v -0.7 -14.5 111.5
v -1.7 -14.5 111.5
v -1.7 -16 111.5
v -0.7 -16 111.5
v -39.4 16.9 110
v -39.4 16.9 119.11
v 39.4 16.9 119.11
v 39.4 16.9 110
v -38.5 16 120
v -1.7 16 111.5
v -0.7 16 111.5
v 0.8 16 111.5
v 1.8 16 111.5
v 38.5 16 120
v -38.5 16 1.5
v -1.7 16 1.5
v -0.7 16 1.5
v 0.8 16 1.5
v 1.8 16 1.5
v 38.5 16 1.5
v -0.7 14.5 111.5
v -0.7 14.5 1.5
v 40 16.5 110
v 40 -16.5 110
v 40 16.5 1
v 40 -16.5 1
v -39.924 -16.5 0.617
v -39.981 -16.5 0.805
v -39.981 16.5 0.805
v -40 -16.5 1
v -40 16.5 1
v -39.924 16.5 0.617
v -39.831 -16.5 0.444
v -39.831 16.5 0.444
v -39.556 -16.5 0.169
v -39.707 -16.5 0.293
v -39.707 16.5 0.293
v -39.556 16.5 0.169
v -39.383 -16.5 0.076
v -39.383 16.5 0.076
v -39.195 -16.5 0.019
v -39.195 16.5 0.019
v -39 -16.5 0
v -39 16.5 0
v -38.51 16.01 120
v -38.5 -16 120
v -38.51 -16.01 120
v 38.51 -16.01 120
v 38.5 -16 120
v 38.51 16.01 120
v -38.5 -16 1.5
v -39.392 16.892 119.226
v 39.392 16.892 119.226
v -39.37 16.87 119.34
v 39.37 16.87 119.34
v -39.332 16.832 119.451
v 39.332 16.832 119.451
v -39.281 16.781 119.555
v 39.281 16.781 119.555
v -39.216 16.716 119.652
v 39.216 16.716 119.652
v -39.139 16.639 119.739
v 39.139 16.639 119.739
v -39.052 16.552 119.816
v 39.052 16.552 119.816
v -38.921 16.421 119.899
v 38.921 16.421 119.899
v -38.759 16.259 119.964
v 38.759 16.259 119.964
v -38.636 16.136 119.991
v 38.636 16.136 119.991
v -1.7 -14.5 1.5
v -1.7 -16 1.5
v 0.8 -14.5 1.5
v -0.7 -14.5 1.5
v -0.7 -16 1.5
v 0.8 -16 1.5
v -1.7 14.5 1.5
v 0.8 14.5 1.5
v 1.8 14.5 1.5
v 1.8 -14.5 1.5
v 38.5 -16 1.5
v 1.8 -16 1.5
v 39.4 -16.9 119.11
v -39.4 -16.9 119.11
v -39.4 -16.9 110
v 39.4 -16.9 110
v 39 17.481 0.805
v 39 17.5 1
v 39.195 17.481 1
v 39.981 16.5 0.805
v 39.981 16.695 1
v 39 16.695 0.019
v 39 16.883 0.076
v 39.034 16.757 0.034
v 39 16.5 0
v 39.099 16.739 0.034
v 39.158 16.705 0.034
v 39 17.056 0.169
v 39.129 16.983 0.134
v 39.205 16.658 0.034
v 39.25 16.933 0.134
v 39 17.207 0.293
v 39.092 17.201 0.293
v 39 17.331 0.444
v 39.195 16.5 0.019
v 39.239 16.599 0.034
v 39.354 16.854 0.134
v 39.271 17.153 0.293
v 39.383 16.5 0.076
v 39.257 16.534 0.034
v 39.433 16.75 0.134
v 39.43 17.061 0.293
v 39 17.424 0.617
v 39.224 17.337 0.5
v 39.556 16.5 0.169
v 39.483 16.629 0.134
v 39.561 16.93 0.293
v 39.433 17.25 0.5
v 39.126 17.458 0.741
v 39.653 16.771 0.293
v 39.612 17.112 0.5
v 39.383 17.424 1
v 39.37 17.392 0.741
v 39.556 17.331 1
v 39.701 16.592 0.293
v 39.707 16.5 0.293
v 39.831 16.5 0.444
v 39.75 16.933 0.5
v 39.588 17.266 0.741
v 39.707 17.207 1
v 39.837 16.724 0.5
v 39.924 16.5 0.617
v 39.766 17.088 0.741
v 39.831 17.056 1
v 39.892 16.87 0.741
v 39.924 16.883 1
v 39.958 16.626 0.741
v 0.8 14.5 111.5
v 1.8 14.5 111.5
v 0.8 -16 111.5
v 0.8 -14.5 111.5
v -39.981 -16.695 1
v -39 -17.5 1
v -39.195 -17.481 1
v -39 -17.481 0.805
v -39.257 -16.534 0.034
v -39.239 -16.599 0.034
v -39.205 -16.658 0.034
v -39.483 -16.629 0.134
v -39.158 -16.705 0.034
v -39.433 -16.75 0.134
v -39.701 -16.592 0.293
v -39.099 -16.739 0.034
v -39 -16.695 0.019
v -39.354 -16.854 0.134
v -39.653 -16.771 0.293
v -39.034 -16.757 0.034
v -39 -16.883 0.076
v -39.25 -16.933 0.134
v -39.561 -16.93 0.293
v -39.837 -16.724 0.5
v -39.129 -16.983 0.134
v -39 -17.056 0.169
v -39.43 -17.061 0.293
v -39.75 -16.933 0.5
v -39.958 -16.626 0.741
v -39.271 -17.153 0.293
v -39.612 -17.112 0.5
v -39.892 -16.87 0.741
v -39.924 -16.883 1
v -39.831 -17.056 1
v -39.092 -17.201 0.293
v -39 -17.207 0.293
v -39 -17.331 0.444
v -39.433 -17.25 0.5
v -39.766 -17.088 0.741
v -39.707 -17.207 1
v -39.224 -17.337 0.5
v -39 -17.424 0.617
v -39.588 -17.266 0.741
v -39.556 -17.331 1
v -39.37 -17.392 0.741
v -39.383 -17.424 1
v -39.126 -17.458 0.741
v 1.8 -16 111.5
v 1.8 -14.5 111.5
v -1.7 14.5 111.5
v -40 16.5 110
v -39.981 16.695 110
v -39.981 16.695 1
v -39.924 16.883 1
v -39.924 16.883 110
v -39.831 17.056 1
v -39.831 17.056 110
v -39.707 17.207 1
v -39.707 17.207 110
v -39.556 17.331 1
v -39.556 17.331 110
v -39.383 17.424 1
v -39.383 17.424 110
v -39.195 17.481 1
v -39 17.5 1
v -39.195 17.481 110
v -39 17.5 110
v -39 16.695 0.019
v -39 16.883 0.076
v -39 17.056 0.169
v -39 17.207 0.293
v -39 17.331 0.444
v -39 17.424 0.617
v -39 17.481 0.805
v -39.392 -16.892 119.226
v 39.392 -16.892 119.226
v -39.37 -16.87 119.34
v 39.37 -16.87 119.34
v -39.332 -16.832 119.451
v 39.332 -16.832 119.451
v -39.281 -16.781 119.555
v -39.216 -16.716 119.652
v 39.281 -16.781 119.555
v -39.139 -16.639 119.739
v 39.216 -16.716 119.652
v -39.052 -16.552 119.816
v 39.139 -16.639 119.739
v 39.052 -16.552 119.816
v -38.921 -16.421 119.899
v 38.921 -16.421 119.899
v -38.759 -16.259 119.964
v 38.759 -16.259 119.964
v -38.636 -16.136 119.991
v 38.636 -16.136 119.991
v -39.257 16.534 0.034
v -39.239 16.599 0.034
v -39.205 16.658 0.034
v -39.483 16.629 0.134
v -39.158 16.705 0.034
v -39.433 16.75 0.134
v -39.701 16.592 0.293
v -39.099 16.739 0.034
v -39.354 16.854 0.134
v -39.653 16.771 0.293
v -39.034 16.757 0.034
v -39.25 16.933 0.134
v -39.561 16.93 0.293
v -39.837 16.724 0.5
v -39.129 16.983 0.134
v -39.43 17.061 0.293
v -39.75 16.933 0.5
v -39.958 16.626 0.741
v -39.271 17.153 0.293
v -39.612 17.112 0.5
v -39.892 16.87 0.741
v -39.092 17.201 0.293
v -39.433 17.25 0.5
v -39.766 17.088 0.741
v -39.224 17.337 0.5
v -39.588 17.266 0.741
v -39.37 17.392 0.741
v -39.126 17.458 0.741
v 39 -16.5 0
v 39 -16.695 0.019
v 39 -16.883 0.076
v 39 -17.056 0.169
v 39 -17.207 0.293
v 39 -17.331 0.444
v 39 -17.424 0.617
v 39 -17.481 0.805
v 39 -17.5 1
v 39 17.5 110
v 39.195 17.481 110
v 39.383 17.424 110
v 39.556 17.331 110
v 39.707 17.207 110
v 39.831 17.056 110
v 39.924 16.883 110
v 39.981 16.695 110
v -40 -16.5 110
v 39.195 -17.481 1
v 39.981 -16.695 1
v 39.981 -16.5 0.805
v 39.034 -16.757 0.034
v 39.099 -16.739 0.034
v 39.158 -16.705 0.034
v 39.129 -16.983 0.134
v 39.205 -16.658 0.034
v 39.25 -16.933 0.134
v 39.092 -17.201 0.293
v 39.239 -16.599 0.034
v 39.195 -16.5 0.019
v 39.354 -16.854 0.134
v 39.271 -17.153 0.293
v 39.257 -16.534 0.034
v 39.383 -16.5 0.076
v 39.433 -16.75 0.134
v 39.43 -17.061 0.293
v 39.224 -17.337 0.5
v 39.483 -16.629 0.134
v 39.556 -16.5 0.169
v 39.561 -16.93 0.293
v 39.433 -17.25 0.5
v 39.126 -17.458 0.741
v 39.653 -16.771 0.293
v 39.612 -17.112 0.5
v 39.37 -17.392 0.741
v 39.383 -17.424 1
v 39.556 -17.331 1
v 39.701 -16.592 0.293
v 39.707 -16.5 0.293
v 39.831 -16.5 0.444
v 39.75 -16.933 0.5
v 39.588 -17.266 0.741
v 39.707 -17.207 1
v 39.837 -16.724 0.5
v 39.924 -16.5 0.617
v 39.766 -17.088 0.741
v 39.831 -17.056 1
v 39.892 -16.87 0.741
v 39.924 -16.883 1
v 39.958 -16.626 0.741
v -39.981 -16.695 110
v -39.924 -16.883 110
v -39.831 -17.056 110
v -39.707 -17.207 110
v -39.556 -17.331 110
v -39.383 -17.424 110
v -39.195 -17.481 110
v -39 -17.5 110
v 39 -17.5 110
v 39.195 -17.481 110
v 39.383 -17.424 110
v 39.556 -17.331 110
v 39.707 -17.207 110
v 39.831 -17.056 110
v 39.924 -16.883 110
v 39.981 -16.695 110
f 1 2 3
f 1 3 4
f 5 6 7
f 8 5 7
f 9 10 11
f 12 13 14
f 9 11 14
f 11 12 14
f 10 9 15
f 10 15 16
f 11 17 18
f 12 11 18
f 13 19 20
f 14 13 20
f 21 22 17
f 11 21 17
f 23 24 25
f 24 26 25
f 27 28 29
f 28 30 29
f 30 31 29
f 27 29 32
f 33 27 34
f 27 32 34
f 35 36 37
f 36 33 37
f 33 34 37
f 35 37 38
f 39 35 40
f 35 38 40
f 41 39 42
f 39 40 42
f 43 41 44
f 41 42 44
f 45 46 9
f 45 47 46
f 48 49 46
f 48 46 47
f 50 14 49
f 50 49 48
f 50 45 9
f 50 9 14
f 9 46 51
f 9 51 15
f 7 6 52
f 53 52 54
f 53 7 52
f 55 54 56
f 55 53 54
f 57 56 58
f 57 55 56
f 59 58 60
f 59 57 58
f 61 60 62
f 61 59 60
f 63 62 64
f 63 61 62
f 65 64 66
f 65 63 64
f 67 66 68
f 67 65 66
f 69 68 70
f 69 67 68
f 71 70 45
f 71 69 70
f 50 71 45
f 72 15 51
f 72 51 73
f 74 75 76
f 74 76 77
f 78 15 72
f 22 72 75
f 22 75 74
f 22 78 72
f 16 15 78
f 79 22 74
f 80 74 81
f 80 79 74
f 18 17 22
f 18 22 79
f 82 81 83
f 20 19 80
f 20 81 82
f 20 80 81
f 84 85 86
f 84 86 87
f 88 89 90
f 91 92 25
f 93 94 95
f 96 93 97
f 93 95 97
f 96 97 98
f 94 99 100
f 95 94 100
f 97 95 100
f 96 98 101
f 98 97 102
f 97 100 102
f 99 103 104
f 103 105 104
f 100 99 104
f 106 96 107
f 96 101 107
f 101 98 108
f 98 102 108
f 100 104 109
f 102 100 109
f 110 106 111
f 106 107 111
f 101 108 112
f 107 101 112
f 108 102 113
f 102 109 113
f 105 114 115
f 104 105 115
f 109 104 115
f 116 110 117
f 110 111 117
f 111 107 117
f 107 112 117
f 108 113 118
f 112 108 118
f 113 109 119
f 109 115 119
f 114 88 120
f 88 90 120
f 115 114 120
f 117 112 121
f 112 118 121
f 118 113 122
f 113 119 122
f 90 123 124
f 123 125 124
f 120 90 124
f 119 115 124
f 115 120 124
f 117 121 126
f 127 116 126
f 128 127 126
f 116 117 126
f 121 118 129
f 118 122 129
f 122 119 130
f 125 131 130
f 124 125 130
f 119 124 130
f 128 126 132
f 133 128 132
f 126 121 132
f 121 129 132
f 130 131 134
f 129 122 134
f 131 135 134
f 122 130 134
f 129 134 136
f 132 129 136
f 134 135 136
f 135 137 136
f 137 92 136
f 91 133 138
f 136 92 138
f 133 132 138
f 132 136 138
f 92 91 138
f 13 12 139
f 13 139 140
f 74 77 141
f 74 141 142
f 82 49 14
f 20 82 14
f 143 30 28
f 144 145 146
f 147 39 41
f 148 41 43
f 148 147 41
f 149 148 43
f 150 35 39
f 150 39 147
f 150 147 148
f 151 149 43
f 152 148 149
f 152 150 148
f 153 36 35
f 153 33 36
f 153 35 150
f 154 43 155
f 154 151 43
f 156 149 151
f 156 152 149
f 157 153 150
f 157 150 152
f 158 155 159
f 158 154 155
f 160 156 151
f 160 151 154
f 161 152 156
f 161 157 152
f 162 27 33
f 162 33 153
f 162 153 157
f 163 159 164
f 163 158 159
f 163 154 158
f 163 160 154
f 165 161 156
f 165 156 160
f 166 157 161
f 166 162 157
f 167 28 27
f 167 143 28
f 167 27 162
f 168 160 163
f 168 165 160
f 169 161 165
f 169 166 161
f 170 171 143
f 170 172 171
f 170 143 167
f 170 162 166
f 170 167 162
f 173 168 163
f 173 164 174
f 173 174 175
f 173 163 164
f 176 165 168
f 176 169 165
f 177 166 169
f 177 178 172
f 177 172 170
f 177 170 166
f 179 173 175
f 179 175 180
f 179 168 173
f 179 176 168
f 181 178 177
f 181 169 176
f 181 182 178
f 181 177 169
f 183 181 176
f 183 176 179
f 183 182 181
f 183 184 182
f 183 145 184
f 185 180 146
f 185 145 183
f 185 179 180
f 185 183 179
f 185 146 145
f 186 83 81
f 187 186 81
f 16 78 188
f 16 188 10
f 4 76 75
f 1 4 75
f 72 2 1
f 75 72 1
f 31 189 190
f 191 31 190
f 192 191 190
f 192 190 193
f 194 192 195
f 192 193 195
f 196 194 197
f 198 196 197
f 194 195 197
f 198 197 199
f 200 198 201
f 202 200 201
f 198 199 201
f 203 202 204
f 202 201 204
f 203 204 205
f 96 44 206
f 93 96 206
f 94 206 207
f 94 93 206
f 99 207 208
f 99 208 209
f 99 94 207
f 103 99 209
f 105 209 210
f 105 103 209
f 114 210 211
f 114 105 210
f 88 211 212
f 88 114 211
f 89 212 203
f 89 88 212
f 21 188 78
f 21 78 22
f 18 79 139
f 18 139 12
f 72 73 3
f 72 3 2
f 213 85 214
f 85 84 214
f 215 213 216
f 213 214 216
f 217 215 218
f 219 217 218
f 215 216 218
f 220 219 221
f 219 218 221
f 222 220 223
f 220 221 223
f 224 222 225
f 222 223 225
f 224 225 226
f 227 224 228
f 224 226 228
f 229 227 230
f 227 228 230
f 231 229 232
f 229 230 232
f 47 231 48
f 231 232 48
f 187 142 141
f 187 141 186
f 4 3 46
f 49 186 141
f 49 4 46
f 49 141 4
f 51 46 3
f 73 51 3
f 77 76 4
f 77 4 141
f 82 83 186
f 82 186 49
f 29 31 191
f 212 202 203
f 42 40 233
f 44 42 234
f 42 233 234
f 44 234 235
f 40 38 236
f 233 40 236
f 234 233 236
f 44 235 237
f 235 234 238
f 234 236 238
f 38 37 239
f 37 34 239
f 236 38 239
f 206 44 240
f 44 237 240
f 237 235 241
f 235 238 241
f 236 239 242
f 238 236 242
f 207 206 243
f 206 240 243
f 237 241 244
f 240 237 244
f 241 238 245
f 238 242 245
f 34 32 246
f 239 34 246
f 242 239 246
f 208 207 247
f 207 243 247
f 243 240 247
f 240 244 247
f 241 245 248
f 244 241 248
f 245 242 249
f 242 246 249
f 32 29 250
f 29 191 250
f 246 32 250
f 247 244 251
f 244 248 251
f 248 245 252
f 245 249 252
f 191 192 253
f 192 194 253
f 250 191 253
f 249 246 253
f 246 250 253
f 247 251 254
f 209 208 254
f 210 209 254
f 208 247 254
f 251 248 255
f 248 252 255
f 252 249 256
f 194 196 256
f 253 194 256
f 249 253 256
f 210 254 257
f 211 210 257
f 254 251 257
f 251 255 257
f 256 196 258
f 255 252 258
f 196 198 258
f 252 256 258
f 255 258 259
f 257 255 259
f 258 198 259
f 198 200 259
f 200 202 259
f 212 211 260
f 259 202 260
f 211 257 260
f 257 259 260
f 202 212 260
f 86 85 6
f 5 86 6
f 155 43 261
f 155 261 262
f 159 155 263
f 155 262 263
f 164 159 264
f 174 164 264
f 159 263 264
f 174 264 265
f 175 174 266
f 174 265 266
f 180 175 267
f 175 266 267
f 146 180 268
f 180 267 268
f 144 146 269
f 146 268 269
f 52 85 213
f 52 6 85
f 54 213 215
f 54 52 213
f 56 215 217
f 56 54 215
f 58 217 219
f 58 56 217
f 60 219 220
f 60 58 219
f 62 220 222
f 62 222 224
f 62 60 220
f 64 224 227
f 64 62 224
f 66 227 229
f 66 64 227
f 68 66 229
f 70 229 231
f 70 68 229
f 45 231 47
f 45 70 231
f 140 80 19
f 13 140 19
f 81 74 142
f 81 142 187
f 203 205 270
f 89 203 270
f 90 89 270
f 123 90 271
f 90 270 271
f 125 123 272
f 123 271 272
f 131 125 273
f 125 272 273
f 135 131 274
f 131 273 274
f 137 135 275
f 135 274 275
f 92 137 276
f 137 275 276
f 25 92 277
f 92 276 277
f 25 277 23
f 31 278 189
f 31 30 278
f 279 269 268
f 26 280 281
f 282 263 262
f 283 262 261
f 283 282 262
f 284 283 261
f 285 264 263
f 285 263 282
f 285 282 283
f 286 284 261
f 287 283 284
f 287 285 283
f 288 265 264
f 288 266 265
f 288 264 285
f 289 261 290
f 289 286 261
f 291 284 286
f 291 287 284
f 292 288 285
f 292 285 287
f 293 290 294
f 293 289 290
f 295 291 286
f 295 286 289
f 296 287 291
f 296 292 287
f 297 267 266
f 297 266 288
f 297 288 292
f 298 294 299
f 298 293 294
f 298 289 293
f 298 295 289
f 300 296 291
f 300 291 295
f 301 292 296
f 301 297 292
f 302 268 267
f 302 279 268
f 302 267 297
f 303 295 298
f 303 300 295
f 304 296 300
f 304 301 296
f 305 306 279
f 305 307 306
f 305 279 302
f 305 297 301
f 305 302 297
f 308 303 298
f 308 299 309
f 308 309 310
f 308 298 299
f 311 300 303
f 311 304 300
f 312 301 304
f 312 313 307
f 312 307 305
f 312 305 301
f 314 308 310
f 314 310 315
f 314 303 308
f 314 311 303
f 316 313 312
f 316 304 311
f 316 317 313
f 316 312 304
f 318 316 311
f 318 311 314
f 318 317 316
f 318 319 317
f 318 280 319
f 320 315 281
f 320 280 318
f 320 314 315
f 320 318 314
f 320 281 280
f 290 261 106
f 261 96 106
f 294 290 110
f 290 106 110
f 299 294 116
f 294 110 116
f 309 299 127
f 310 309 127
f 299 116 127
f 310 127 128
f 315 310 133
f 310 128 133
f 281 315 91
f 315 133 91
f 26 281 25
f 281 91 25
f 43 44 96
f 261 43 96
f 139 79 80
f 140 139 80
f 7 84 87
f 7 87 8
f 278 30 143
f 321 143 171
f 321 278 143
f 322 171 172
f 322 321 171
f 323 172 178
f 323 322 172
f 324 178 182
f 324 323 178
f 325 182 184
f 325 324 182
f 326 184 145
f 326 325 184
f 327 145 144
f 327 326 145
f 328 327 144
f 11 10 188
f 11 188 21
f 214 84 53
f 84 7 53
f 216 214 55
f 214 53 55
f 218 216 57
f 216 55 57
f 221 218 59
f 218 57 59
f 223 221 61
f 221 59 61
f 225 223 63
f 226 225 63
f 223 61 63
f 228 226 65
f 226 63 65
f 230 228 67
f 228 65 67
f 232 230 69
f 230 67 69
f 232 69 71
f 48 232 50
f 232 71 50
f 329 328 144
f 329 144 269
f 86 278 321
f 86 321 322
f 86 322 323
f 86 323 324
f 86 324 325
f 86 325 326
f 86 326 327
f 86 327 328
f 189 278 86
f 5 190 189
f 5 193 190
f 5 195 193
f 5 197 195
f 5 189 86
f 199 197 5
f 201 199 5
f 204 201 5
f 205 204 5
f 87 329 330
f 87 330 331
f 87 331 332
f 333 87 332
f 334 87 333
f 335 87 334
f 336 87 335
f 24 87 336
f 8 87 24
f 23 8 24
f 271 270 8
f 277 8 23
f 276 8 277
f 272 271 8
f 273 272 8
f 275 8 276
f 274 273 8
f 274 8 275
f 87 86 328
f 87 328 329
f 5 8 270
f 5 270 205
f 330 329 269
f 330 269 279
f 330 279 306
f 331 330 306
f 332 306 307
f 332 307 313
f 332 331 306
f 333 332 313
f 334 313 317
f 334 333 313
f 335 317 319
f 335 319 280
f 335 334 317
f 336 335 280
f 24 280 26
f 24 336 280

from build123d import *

# Parameters (mm, degrees)
SKETCH_W      = 80
SKETCH_H      = 35
PAD_DEPTH     = 120
THICKNESS_T   = -1.5
SKETCH001_W   = 80
SKETCH001_H   = 35
SKETCH001_W_2 = 78.8
SKETCH001_H_2 = 33.8
POCKET_DEPTH  = 10
FILLET001_R   = 1
SKETCH003_W   = 1
SKETCH003_H   = 1.5
PAD002_DEPTH  = 110
FILLET002_R   = 0.89


with BuildPart() as part:
    # Sketch → Pad (new body)
    with BuildSketch(Plane.XY):
        Rectangle(SKETCH_W, SKETCH_H)
    extrude(amount=PAD_DEPTH)

    # Thickness
    thickness_openings = [part.faces().sort_by_distance(p)[0] for p in [
        (0, 0, 120),
    ]]
    offset(amount=THICKNESS_T, openings=thickness_openings)

    # Sketch001 (on Face6 of Thickness) → Pocket (cut)
    with BuildSketch(Plane.XY.offset(120)):
        Rectangle(SKETCH001_W, SKETCH001_H)
        Rectangle(SKETCH001_W_2, SKETCH001_H_2, mode=Mode.SUBTRACT)
    extrude(amount=-POCKET_DEPTH, mode=Mode.SUBTRACT)

    # Fillet001
    fillet001_edges = [part.edges().sort_by_distance(p)[0] for p in [
        (40, -17.5, 55),
        (40, 17.5, 55),
        (-40, -17.5, 55),
        (-40, 17.5, 55),
        (-40, 0, 0),
        (0, -17.5, 0),
        (0, 17.5, 0),
        (40, 0, 0),
    ]]
    fillet(fillet001_edges, radius=FILLET001_R)

    # Sketch003 (on Face28 of Fillet001) → Pad002 (join)
    with BuildSketch(Plane.XY.offset(1.5)):
        with Locations((1.3, 15.25)):
            Rectangle(SKETCH003_W, SKETCH003_H)
        with Locations((-1.2, -15.25)):
            Rectangle(SKETCH003_W, SKETCH003_H)
        with Locations((1.3, -15.25)):
            Rectangle(SKETCH003_W, SKETCH003_H)
        with Locations((-1.2, 15.25)):
            Rectangle(SKETCH003_W, SKETCH003_H)
    extrude(amount=PAD002_DEPTH)

    # Fillet002
    fillet002_edges = [part.edges().sort_by_distance(p)[0] for p in [
        (0, -16.9, 120),
        (39.4, 0, 120),
        (0, 16.9, 120),
        (-39.4, 0, 120),
    ]]
    fillet(fillet002_edges, radius=FILLET002_R)


solid = part.part
